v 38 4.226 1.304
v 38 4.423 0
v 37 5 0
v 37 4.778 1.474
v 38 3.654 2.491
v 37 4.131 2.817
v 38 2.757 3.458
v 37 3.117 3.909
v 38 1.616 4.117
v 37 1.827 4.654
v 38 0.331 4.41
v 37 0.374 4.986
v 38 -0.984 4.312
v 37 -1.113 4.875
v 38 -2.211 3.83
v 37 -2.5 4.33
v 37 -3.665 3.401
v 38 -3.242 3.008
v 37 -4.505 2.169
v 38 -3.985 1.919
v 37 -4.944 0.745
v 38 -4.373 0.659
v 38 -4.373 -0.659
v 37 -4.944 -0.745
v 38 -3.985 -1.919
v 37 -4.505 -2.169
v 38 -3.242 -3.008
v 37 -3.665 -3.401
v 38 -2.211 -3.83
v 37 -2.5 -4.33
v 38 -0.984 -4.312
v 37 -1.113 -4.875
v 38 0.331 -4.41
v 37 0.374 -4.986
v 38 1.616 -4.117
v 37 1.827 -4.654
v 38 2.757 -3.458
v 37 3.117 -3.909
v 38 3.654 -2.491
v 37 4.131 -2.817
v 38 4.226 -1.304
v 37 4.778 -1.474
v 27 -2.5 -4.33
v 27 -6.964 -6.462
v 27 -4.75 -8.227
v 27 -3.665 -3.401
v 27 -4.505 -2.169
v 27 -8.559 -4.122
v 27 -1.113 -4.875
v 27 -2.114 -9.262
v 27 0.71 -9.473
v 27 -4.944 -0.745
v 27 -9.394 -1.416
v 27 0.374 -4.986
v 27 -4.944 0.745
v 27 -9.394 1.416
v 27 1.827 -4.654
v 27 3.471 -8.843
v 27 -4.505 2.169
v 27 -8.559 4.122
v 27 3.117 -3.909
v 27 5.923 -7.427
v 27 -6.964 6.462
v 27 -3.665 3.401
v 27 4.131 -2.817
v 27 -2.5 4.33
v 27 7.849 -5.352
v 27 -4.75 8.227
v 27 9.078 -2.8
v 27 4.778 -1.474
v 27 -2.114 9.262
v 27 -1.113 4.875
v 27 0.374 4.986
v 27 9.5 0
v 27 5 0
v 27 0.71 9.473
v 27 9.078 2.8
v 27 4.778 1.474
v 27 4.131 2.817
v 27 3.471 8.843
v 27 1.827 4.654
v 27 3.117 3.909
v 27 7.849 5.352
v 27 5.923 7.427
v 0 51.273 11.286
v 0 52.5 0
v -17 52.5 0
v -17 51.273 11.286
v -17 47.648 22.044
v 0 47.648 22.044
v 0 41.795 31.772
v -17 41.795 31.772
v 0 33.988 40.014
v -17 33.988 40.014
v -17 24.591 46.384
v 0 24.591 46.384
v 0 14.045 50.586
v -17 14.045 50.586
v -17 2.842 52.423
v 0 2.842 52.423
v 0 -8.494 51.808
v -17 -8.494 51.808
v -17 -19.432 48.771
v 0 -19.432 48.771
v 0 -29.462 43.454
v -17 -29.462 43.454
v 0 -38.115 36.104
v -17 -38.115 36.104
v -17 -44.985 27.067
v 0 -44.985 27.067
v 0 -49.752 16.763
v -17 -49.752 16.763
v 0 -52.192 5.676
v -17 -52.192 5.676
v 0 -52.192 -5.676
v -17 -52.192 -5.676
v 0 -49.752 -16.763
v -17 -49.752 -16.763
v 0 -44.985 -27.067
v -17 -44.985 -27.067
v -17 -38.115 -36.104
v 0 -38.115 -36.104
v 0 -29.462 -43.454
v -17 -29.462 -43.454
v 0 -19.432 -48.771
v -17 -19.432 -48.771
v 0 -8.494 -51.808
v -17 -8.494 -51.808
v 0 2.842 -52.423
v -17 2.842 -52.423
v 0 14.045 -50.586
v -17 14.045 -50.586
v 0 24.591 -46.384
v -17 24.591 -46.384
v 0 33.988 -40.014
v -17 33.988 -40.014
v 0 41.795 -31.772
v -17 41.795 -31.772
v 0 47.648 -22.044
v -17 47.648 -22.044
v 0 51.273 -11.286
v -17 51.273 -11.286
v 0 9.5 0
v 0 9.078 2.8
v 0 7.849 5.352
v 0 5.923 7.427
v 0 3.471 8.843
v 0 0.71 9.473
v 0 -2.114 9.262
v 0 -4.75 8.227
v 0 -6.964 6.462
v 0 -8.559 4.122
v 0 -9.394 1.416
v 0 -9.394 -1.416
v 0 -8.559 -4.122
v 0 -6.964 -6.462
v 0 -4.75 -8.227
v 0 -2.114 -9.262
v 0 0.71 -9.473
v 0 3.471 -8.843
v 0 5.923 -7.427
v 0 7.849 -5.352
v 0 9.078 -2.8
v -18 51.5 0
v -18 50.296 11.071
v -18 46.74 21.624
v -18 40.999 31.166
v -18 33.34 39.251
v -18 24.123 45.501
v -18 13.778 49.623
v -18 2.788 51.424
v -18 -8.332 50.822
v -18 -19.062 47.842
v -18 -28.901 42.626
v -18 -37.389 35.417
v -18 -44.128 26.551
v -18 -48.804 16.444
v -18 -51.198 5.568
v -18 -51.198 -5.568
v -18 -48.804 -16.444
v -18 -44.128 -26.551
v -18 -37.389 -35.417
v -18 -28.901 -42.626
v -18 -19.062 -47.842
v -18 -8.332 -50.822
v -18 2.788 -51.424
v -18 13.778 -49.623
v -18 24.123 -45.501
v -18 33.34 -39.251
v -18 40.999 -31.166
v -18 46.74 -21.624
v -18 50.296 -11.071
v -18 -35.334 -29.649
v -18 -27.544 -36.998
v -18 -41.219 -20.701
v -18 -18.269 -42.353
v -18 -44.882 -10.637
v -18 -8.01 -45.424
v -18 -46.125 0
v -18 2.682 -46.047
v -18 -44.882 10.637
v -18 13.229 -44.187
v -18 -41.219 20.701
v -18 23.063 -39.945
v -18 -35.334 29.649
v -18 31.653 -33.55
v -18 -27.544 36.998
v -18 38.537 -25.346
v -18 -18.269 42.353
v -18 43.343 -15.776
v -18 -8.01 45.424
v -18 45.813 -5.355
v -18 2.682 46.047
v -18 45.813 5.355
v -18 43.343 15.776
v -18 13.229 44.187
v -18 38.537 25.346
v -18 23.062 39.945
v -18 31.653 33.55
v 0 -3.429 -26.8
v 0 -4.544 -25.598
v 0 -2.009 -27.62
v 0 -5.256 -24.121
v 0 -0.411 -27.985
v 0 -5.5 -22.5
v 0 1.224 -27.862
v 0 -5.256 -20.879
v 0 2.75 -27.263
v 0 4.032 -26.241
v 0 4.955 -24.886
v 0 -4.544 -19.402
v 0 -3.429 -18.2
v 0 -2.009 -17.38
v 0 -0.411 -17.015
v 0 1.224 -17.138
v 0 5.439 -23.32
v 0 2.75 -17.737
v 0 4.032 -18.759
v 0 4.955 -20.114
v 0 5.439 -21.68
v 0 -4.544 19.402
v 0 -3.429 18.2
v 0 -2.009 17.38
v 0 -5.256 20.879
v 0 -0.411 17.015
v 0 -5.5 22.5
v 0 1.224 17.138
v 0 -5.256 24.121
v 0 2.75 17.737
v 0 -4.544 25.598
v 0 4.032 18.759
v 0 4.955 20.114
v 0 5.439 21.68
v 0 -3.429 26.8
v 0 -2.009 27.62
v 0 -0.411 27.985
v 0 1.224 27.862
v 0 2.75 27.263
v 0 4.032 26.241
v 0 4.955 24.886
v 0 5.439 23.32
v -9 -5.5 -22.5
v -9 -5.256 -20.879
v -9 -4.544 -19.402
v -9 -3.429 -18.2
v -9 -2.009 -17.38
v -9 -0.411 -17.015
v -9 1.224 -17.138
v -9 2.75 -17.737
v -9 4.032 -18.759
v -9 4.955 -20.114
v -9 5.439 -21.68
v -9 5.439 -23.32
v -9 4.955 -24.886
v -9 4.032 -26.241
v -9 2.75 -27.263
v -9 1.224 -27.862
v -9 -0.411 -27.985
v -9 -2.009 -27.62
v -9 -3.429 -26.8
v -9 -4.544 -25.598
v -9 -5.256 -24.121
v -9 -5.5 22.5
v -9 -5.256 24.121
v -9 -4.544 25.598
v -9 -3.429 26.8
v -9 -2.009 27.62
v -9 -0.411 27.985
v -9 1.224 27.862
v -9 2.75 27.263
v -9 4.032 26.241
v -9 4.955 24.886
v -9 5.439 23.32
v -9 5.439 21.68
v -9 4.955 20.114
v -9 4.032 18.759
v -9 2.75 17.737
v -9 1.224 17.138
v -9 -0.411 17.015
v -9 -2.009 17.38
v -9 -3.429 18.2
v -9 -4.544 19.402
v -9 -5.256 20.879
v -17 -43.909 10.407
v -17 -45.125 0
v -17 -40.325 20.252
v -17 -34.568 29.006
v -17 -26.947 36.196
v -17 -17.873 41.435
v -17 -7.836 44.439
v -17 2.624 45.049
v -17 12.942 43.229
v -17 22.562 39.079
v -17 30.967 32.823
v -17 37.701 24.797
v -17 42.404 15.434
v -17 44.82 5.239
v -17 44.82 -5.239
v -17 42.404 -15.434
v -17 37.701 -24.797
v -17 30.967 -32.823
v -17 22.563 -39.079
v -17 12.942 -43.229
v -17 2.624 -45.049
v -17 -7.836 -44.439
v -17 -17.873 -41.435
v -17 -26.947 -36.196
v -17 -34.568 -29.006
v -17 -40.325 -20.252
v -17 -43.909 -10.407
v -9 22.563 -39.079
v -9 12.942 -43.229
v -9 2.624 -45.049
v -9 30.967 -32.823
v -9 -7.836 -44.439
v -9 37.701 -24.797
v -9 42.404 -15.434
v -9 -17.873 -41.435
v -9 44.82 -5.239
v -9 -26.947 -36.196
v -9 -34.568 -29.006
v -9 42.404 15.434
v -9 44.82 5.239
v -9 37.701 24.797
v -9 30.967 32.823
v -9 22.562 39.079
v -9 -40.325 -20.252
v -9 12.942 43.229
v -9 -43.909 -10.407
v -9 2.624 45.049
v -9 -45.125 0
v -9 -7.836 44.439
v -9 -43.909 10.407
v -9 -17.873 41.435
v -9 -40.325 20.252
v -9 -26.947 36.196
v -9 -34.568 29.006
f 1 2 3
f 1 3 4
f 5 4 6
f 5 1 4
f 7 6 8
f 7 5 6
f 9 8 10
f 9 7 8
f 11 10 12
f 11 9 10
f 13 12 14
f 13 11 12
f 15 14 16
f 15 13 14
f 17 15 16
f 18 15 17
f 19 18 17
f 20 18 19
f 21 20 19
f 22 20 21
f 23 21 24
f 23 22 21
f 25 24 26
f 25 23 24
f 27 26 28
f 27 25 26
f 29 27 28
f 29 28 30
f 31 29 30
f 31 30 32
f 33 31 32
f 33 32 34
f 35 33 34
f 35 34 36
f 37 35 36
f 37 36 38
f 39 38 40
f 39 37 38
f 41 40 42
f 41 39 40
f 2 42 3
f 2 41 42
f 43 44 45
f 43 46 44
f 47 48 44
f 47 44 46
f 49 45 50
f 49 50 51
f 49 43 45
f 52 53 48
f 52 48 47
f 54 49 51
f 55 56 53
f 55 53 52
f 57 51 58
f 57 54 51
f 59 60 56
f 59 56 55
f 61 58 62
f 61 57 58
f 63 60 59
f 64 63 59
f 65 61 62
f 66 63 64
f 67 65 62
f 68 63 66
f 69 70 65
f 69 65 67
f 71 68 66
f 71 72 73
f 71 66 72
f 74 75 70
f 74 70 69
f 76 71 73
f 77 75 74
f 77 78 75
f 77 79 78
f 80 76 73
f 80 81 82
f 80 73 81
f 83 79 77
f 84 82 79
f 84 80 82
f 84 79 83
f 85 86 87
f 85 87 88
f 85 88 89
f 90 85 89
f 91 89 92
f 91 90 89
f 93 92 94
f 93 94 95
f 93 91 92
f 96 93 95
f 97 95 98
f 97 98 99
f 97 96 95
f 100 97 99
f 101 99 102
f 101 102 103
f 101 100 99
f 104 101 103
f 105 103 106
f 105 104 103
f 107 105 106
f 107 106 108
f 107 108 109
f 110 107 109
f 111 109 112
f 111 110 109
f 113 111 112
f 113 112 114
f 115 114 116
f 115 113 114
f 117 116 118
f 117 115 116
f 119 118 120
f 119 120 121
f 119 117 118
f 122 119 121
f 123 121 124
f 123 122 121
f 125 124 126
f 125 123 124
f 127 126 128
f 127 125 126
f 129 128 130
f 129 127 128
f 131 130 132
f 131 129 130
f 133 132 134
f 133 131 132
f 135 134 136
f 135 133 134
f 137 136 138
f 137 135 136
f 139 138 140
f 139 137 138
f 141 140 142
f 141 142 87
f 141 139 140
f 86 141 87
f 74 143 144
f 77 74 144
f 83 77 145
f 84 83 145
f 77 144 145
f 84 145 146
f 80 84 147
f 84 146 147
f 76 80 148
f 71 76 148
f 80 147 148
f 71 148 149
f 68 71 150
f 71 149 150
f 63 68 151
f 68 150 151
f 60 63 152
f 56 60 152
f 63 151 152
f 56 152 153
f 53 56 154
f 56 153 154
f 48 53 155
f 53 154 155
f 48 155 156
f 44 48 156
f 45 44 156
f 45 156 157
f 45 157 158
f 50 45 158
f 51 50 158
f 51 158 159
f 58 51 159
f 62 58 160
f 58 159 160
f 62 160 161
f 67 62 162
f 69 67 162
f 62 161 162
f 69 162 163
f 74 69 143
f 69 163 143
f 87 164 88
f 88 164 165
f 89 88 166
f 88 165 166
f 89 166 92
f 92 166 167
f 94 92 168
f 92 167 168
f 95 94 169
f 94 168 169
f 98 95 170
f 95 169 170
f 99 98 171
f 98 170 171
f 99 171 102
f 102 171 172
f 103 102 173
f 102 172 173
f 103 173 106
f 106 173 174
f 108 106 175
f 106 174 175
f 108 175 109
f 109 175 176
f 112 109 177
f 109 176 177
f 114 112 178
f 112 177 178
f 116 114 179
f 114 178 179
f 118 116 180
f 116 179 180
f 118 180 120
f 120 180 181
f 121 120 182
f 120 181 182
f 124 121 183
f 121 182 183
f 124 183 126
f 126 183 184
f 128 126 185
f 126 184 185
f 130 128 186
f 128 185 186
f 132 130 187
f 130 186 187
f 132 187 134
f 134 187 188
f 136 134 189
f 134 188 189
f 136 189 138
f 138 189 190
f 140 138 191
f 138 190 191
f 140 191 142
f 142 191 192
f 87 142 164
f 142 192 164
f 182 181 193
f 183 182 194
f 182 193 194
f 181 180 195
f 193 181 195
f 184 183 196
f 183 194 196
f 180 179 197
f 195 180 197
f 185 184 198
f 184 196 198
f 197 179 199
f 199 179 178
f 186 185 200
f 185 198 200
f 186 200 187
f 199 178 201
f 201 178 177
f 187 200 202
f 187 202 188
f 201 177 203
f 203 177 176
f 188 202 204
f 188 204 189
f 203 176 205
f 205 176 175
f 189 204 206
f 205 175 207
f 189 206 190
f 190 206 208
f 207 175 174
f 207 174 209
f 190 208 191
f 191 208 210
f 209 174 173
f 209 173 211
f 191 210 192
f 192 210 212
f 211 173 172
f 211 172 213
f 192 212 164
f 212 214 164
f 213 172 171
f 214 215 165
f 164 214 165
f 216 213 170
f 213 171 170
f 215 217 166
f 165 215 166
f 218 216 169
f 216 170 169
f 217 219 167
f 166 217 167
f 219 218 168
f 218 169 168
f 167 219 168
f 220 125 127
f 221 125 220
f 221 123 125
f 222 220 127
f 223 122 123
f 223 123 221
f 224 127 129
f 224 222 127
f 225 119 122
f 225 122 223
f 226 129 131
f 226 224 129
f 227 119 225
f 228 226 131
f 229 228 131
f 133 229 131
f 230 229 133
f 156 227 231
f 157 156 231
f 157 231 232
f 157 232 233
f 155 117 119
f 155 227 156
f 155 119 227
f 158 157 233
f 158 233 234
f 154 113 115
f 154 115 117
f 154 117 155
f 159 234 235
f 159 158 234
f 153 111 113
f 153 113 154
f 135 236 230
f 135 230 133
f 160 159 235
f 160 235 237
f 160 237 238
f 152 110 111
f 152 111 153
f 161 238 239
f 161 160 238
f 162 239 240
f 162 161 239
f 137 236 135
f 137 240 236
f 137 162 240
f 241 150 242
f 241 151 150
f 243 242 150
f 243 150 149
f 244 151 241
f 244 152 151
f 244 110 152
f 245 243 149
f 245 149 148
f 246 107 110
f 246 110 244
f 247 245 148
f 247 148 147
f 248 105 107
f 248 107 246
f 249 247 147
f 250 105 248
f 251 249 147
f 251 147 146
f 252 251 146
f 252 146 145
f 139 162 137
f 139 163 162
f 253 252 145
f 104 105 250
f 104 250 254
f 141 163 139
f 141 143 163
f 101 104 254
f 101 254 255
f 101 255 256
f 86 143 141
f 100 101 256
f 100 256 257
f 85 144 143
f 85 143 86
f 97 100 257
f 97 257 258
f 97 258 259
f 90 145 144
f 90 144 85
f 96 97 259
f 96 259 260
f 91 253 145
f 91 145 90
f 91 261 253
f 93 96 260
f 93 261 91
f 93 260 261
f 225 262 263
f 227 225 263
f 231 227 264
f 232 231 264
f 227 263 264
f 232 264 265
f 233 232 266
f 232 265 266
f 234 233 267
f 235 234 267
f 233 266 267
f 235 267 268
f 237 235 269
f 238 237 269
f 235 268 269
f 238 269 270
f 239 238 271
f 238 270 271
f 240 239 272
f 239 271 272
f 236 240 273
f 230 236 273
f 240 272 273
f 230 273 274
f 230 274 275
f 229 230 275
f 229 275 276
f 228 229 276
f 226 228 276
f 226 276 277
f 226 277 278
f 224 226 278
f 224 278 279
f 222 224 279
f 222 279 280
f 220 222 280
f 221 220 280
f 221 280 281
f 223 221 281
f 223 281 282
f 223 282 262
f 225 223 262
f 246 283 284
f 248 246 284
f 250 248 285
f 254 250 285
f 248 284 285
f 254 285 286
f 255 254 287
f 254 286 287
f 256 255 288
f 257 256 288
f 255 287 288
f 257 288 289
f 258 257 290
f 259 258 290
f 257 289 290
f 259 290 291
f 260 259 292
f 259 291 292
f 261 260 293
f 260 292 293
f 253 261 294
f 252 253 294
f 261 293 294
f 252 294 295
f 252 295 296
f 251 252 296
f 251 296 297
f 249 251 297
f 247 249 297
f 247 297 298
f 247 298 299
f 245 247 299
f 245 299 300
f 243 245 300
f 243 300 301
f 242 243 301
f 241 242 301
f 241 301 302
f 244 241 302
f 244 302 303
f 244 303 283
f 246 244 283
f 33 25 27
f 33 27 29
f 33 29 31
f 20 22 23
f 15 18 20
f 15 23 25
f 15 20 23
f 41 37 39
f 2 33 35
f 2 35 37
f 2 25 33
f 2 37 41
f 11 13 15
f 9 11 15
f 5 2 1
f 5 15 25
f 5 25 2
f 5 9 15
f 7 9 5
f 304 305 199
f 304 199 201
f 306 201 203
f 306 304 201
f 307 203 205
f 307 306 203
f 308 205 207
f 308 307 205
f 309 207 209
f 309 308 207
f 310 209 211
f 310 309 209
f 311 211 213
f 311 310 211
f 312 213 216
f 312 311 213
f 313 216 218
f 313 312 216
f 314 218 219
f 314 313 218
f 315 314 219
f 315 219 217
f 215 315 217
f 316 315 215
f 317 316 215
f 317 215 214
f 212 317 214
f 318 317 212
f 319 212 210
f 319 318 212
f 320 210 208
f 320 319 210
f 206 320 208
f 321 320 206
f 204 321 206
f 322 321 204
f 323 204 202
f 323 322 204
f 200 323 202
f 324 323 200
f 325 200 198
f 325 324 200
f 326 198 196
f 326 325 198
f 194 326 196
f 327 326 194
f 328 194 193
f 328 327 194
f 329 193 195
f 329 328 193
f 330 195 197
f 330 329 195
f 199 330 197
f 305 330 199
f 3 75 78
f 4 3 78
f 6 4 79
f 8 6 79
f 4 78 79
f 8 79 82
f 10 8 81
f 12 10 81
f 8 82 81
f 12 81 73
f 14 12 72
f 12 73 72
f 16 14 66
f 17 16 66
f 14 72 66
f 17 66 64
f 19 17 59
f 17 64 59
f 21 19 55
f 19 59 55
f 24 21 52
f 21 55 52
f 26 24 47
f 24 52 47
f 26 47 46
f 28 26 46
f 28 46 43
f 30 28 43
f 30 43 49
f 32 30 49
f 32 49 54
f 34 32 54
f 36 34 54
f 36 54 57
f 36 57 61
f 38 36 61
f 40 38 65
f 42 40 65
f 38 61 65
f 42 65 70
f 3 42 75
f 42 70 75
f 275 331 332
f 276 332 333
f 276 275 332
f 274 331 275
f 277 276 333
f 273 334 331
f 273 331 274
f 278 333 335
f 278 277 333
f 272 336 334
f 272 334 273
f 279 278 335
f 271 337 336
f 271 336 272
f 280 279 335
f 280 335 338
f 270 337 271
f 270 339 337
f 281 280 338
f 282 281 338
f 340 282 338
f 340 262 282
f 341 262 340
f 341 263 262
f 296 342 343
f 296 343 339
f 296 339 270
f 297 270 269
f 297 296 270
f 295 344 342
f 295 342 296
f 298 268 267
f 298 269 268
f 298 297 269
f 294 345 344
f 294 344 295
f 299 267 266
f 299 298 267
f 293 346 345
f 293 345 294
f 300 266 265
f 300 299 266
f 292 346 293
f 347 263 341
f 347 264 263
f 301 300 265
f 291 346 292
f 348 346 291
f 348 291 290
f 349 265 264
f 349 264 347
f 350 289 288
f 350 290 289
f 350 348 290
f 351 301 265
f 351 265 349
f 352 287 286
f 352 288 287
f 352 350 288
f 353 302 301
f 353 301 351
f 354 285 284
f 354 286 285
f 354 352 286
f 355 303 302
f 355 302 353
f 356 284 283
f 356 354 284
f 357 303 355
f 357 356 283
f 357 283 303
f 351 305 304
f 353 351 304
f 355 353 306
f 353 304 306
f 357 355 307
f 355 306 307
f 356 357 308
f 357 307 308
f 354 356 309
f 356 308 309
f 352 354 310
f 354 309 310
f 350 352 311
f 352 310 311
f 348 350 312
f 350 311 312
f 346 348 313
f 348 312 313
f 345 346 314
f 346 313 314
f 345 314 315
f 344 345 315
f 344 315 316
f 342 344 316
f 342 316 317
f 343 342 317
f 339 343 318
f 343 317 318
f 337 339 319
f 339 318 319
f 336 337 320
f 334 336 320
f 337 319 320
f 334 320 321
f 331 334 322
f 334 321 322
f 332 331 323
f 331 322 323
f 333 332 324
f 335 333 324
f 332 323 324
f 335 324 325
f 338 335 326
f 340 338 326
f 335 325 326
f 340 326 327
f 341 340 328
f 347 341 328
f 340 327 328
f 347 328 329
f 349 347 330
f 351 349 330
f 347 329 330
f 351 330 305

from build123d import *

# Parameters (mm, degrees)
F0_R     = 52.5
F1_DEPTH = 18
F2_R     = 45.125
F3_DEPTH = 9
F4_SIZE  = 1
F5_R     = 9.5
F6_DEPTH = 27
F7_R     = 5
F8_DEPTH = 11
F9_SIZE2 = 0.5773502692
F9_SIZE  = 1
F11_D    = 11


with BuildPart() as f1:
    # F0 (on Right) → F1 (new body)
    with BuildSketch(Plane.YZ):
        Circle(F0_R)
    extrude(amount=-F1_DEPTH)

    # F2 (on face) → F3 (cut)
    with BuildSketch(Plane(origin=(-18, 0, 0), x_dir=(0, -1, 0), z_dir=(-1, 0, 0))):
        Circle(F2_R)
    extrude(amount=-F3_DEPTH, mode=Mode.SUBTRACT)

    # F4
    f4_edges = [f1.edges().sort_by_distance(p)[0] for p in [
        (-18, -52.5, 0),
        (-18, 45.125, 0),
    ]]
    chamfer(f4_edges, length=F4_SIZE)

    # F5 (on face) → F6 (join)
    with BuildSketch(Plane.YZ):
        Circle(F5_R)
    extrude(amount=F6_DEPTH)

    # F7 (on face) → F8 (join)
    with BuildSketch(Plane.YZ.offset(27)):
        Circle(F7_R)
    extrude(amount=F8_DEPTH)

    # F9
    f9_edges = [f1.edges().sort_by_distance(p)[0] for p in [
        (38, -5, 0),
    ]]
    f9_side = f1.faces().sort_by_distance((32.5, -5, 0))[0]
    chamfer(f9_edges, length=F9_SIZE, length2=F9_SIZE2, reference=f9_side)

    # F11 (through all)
    with Locations(Plane.YZ):
        with Locations((0, -22.5), (0, 22.5)):
            Hole(F11_D / 2)


solid = f1.part
